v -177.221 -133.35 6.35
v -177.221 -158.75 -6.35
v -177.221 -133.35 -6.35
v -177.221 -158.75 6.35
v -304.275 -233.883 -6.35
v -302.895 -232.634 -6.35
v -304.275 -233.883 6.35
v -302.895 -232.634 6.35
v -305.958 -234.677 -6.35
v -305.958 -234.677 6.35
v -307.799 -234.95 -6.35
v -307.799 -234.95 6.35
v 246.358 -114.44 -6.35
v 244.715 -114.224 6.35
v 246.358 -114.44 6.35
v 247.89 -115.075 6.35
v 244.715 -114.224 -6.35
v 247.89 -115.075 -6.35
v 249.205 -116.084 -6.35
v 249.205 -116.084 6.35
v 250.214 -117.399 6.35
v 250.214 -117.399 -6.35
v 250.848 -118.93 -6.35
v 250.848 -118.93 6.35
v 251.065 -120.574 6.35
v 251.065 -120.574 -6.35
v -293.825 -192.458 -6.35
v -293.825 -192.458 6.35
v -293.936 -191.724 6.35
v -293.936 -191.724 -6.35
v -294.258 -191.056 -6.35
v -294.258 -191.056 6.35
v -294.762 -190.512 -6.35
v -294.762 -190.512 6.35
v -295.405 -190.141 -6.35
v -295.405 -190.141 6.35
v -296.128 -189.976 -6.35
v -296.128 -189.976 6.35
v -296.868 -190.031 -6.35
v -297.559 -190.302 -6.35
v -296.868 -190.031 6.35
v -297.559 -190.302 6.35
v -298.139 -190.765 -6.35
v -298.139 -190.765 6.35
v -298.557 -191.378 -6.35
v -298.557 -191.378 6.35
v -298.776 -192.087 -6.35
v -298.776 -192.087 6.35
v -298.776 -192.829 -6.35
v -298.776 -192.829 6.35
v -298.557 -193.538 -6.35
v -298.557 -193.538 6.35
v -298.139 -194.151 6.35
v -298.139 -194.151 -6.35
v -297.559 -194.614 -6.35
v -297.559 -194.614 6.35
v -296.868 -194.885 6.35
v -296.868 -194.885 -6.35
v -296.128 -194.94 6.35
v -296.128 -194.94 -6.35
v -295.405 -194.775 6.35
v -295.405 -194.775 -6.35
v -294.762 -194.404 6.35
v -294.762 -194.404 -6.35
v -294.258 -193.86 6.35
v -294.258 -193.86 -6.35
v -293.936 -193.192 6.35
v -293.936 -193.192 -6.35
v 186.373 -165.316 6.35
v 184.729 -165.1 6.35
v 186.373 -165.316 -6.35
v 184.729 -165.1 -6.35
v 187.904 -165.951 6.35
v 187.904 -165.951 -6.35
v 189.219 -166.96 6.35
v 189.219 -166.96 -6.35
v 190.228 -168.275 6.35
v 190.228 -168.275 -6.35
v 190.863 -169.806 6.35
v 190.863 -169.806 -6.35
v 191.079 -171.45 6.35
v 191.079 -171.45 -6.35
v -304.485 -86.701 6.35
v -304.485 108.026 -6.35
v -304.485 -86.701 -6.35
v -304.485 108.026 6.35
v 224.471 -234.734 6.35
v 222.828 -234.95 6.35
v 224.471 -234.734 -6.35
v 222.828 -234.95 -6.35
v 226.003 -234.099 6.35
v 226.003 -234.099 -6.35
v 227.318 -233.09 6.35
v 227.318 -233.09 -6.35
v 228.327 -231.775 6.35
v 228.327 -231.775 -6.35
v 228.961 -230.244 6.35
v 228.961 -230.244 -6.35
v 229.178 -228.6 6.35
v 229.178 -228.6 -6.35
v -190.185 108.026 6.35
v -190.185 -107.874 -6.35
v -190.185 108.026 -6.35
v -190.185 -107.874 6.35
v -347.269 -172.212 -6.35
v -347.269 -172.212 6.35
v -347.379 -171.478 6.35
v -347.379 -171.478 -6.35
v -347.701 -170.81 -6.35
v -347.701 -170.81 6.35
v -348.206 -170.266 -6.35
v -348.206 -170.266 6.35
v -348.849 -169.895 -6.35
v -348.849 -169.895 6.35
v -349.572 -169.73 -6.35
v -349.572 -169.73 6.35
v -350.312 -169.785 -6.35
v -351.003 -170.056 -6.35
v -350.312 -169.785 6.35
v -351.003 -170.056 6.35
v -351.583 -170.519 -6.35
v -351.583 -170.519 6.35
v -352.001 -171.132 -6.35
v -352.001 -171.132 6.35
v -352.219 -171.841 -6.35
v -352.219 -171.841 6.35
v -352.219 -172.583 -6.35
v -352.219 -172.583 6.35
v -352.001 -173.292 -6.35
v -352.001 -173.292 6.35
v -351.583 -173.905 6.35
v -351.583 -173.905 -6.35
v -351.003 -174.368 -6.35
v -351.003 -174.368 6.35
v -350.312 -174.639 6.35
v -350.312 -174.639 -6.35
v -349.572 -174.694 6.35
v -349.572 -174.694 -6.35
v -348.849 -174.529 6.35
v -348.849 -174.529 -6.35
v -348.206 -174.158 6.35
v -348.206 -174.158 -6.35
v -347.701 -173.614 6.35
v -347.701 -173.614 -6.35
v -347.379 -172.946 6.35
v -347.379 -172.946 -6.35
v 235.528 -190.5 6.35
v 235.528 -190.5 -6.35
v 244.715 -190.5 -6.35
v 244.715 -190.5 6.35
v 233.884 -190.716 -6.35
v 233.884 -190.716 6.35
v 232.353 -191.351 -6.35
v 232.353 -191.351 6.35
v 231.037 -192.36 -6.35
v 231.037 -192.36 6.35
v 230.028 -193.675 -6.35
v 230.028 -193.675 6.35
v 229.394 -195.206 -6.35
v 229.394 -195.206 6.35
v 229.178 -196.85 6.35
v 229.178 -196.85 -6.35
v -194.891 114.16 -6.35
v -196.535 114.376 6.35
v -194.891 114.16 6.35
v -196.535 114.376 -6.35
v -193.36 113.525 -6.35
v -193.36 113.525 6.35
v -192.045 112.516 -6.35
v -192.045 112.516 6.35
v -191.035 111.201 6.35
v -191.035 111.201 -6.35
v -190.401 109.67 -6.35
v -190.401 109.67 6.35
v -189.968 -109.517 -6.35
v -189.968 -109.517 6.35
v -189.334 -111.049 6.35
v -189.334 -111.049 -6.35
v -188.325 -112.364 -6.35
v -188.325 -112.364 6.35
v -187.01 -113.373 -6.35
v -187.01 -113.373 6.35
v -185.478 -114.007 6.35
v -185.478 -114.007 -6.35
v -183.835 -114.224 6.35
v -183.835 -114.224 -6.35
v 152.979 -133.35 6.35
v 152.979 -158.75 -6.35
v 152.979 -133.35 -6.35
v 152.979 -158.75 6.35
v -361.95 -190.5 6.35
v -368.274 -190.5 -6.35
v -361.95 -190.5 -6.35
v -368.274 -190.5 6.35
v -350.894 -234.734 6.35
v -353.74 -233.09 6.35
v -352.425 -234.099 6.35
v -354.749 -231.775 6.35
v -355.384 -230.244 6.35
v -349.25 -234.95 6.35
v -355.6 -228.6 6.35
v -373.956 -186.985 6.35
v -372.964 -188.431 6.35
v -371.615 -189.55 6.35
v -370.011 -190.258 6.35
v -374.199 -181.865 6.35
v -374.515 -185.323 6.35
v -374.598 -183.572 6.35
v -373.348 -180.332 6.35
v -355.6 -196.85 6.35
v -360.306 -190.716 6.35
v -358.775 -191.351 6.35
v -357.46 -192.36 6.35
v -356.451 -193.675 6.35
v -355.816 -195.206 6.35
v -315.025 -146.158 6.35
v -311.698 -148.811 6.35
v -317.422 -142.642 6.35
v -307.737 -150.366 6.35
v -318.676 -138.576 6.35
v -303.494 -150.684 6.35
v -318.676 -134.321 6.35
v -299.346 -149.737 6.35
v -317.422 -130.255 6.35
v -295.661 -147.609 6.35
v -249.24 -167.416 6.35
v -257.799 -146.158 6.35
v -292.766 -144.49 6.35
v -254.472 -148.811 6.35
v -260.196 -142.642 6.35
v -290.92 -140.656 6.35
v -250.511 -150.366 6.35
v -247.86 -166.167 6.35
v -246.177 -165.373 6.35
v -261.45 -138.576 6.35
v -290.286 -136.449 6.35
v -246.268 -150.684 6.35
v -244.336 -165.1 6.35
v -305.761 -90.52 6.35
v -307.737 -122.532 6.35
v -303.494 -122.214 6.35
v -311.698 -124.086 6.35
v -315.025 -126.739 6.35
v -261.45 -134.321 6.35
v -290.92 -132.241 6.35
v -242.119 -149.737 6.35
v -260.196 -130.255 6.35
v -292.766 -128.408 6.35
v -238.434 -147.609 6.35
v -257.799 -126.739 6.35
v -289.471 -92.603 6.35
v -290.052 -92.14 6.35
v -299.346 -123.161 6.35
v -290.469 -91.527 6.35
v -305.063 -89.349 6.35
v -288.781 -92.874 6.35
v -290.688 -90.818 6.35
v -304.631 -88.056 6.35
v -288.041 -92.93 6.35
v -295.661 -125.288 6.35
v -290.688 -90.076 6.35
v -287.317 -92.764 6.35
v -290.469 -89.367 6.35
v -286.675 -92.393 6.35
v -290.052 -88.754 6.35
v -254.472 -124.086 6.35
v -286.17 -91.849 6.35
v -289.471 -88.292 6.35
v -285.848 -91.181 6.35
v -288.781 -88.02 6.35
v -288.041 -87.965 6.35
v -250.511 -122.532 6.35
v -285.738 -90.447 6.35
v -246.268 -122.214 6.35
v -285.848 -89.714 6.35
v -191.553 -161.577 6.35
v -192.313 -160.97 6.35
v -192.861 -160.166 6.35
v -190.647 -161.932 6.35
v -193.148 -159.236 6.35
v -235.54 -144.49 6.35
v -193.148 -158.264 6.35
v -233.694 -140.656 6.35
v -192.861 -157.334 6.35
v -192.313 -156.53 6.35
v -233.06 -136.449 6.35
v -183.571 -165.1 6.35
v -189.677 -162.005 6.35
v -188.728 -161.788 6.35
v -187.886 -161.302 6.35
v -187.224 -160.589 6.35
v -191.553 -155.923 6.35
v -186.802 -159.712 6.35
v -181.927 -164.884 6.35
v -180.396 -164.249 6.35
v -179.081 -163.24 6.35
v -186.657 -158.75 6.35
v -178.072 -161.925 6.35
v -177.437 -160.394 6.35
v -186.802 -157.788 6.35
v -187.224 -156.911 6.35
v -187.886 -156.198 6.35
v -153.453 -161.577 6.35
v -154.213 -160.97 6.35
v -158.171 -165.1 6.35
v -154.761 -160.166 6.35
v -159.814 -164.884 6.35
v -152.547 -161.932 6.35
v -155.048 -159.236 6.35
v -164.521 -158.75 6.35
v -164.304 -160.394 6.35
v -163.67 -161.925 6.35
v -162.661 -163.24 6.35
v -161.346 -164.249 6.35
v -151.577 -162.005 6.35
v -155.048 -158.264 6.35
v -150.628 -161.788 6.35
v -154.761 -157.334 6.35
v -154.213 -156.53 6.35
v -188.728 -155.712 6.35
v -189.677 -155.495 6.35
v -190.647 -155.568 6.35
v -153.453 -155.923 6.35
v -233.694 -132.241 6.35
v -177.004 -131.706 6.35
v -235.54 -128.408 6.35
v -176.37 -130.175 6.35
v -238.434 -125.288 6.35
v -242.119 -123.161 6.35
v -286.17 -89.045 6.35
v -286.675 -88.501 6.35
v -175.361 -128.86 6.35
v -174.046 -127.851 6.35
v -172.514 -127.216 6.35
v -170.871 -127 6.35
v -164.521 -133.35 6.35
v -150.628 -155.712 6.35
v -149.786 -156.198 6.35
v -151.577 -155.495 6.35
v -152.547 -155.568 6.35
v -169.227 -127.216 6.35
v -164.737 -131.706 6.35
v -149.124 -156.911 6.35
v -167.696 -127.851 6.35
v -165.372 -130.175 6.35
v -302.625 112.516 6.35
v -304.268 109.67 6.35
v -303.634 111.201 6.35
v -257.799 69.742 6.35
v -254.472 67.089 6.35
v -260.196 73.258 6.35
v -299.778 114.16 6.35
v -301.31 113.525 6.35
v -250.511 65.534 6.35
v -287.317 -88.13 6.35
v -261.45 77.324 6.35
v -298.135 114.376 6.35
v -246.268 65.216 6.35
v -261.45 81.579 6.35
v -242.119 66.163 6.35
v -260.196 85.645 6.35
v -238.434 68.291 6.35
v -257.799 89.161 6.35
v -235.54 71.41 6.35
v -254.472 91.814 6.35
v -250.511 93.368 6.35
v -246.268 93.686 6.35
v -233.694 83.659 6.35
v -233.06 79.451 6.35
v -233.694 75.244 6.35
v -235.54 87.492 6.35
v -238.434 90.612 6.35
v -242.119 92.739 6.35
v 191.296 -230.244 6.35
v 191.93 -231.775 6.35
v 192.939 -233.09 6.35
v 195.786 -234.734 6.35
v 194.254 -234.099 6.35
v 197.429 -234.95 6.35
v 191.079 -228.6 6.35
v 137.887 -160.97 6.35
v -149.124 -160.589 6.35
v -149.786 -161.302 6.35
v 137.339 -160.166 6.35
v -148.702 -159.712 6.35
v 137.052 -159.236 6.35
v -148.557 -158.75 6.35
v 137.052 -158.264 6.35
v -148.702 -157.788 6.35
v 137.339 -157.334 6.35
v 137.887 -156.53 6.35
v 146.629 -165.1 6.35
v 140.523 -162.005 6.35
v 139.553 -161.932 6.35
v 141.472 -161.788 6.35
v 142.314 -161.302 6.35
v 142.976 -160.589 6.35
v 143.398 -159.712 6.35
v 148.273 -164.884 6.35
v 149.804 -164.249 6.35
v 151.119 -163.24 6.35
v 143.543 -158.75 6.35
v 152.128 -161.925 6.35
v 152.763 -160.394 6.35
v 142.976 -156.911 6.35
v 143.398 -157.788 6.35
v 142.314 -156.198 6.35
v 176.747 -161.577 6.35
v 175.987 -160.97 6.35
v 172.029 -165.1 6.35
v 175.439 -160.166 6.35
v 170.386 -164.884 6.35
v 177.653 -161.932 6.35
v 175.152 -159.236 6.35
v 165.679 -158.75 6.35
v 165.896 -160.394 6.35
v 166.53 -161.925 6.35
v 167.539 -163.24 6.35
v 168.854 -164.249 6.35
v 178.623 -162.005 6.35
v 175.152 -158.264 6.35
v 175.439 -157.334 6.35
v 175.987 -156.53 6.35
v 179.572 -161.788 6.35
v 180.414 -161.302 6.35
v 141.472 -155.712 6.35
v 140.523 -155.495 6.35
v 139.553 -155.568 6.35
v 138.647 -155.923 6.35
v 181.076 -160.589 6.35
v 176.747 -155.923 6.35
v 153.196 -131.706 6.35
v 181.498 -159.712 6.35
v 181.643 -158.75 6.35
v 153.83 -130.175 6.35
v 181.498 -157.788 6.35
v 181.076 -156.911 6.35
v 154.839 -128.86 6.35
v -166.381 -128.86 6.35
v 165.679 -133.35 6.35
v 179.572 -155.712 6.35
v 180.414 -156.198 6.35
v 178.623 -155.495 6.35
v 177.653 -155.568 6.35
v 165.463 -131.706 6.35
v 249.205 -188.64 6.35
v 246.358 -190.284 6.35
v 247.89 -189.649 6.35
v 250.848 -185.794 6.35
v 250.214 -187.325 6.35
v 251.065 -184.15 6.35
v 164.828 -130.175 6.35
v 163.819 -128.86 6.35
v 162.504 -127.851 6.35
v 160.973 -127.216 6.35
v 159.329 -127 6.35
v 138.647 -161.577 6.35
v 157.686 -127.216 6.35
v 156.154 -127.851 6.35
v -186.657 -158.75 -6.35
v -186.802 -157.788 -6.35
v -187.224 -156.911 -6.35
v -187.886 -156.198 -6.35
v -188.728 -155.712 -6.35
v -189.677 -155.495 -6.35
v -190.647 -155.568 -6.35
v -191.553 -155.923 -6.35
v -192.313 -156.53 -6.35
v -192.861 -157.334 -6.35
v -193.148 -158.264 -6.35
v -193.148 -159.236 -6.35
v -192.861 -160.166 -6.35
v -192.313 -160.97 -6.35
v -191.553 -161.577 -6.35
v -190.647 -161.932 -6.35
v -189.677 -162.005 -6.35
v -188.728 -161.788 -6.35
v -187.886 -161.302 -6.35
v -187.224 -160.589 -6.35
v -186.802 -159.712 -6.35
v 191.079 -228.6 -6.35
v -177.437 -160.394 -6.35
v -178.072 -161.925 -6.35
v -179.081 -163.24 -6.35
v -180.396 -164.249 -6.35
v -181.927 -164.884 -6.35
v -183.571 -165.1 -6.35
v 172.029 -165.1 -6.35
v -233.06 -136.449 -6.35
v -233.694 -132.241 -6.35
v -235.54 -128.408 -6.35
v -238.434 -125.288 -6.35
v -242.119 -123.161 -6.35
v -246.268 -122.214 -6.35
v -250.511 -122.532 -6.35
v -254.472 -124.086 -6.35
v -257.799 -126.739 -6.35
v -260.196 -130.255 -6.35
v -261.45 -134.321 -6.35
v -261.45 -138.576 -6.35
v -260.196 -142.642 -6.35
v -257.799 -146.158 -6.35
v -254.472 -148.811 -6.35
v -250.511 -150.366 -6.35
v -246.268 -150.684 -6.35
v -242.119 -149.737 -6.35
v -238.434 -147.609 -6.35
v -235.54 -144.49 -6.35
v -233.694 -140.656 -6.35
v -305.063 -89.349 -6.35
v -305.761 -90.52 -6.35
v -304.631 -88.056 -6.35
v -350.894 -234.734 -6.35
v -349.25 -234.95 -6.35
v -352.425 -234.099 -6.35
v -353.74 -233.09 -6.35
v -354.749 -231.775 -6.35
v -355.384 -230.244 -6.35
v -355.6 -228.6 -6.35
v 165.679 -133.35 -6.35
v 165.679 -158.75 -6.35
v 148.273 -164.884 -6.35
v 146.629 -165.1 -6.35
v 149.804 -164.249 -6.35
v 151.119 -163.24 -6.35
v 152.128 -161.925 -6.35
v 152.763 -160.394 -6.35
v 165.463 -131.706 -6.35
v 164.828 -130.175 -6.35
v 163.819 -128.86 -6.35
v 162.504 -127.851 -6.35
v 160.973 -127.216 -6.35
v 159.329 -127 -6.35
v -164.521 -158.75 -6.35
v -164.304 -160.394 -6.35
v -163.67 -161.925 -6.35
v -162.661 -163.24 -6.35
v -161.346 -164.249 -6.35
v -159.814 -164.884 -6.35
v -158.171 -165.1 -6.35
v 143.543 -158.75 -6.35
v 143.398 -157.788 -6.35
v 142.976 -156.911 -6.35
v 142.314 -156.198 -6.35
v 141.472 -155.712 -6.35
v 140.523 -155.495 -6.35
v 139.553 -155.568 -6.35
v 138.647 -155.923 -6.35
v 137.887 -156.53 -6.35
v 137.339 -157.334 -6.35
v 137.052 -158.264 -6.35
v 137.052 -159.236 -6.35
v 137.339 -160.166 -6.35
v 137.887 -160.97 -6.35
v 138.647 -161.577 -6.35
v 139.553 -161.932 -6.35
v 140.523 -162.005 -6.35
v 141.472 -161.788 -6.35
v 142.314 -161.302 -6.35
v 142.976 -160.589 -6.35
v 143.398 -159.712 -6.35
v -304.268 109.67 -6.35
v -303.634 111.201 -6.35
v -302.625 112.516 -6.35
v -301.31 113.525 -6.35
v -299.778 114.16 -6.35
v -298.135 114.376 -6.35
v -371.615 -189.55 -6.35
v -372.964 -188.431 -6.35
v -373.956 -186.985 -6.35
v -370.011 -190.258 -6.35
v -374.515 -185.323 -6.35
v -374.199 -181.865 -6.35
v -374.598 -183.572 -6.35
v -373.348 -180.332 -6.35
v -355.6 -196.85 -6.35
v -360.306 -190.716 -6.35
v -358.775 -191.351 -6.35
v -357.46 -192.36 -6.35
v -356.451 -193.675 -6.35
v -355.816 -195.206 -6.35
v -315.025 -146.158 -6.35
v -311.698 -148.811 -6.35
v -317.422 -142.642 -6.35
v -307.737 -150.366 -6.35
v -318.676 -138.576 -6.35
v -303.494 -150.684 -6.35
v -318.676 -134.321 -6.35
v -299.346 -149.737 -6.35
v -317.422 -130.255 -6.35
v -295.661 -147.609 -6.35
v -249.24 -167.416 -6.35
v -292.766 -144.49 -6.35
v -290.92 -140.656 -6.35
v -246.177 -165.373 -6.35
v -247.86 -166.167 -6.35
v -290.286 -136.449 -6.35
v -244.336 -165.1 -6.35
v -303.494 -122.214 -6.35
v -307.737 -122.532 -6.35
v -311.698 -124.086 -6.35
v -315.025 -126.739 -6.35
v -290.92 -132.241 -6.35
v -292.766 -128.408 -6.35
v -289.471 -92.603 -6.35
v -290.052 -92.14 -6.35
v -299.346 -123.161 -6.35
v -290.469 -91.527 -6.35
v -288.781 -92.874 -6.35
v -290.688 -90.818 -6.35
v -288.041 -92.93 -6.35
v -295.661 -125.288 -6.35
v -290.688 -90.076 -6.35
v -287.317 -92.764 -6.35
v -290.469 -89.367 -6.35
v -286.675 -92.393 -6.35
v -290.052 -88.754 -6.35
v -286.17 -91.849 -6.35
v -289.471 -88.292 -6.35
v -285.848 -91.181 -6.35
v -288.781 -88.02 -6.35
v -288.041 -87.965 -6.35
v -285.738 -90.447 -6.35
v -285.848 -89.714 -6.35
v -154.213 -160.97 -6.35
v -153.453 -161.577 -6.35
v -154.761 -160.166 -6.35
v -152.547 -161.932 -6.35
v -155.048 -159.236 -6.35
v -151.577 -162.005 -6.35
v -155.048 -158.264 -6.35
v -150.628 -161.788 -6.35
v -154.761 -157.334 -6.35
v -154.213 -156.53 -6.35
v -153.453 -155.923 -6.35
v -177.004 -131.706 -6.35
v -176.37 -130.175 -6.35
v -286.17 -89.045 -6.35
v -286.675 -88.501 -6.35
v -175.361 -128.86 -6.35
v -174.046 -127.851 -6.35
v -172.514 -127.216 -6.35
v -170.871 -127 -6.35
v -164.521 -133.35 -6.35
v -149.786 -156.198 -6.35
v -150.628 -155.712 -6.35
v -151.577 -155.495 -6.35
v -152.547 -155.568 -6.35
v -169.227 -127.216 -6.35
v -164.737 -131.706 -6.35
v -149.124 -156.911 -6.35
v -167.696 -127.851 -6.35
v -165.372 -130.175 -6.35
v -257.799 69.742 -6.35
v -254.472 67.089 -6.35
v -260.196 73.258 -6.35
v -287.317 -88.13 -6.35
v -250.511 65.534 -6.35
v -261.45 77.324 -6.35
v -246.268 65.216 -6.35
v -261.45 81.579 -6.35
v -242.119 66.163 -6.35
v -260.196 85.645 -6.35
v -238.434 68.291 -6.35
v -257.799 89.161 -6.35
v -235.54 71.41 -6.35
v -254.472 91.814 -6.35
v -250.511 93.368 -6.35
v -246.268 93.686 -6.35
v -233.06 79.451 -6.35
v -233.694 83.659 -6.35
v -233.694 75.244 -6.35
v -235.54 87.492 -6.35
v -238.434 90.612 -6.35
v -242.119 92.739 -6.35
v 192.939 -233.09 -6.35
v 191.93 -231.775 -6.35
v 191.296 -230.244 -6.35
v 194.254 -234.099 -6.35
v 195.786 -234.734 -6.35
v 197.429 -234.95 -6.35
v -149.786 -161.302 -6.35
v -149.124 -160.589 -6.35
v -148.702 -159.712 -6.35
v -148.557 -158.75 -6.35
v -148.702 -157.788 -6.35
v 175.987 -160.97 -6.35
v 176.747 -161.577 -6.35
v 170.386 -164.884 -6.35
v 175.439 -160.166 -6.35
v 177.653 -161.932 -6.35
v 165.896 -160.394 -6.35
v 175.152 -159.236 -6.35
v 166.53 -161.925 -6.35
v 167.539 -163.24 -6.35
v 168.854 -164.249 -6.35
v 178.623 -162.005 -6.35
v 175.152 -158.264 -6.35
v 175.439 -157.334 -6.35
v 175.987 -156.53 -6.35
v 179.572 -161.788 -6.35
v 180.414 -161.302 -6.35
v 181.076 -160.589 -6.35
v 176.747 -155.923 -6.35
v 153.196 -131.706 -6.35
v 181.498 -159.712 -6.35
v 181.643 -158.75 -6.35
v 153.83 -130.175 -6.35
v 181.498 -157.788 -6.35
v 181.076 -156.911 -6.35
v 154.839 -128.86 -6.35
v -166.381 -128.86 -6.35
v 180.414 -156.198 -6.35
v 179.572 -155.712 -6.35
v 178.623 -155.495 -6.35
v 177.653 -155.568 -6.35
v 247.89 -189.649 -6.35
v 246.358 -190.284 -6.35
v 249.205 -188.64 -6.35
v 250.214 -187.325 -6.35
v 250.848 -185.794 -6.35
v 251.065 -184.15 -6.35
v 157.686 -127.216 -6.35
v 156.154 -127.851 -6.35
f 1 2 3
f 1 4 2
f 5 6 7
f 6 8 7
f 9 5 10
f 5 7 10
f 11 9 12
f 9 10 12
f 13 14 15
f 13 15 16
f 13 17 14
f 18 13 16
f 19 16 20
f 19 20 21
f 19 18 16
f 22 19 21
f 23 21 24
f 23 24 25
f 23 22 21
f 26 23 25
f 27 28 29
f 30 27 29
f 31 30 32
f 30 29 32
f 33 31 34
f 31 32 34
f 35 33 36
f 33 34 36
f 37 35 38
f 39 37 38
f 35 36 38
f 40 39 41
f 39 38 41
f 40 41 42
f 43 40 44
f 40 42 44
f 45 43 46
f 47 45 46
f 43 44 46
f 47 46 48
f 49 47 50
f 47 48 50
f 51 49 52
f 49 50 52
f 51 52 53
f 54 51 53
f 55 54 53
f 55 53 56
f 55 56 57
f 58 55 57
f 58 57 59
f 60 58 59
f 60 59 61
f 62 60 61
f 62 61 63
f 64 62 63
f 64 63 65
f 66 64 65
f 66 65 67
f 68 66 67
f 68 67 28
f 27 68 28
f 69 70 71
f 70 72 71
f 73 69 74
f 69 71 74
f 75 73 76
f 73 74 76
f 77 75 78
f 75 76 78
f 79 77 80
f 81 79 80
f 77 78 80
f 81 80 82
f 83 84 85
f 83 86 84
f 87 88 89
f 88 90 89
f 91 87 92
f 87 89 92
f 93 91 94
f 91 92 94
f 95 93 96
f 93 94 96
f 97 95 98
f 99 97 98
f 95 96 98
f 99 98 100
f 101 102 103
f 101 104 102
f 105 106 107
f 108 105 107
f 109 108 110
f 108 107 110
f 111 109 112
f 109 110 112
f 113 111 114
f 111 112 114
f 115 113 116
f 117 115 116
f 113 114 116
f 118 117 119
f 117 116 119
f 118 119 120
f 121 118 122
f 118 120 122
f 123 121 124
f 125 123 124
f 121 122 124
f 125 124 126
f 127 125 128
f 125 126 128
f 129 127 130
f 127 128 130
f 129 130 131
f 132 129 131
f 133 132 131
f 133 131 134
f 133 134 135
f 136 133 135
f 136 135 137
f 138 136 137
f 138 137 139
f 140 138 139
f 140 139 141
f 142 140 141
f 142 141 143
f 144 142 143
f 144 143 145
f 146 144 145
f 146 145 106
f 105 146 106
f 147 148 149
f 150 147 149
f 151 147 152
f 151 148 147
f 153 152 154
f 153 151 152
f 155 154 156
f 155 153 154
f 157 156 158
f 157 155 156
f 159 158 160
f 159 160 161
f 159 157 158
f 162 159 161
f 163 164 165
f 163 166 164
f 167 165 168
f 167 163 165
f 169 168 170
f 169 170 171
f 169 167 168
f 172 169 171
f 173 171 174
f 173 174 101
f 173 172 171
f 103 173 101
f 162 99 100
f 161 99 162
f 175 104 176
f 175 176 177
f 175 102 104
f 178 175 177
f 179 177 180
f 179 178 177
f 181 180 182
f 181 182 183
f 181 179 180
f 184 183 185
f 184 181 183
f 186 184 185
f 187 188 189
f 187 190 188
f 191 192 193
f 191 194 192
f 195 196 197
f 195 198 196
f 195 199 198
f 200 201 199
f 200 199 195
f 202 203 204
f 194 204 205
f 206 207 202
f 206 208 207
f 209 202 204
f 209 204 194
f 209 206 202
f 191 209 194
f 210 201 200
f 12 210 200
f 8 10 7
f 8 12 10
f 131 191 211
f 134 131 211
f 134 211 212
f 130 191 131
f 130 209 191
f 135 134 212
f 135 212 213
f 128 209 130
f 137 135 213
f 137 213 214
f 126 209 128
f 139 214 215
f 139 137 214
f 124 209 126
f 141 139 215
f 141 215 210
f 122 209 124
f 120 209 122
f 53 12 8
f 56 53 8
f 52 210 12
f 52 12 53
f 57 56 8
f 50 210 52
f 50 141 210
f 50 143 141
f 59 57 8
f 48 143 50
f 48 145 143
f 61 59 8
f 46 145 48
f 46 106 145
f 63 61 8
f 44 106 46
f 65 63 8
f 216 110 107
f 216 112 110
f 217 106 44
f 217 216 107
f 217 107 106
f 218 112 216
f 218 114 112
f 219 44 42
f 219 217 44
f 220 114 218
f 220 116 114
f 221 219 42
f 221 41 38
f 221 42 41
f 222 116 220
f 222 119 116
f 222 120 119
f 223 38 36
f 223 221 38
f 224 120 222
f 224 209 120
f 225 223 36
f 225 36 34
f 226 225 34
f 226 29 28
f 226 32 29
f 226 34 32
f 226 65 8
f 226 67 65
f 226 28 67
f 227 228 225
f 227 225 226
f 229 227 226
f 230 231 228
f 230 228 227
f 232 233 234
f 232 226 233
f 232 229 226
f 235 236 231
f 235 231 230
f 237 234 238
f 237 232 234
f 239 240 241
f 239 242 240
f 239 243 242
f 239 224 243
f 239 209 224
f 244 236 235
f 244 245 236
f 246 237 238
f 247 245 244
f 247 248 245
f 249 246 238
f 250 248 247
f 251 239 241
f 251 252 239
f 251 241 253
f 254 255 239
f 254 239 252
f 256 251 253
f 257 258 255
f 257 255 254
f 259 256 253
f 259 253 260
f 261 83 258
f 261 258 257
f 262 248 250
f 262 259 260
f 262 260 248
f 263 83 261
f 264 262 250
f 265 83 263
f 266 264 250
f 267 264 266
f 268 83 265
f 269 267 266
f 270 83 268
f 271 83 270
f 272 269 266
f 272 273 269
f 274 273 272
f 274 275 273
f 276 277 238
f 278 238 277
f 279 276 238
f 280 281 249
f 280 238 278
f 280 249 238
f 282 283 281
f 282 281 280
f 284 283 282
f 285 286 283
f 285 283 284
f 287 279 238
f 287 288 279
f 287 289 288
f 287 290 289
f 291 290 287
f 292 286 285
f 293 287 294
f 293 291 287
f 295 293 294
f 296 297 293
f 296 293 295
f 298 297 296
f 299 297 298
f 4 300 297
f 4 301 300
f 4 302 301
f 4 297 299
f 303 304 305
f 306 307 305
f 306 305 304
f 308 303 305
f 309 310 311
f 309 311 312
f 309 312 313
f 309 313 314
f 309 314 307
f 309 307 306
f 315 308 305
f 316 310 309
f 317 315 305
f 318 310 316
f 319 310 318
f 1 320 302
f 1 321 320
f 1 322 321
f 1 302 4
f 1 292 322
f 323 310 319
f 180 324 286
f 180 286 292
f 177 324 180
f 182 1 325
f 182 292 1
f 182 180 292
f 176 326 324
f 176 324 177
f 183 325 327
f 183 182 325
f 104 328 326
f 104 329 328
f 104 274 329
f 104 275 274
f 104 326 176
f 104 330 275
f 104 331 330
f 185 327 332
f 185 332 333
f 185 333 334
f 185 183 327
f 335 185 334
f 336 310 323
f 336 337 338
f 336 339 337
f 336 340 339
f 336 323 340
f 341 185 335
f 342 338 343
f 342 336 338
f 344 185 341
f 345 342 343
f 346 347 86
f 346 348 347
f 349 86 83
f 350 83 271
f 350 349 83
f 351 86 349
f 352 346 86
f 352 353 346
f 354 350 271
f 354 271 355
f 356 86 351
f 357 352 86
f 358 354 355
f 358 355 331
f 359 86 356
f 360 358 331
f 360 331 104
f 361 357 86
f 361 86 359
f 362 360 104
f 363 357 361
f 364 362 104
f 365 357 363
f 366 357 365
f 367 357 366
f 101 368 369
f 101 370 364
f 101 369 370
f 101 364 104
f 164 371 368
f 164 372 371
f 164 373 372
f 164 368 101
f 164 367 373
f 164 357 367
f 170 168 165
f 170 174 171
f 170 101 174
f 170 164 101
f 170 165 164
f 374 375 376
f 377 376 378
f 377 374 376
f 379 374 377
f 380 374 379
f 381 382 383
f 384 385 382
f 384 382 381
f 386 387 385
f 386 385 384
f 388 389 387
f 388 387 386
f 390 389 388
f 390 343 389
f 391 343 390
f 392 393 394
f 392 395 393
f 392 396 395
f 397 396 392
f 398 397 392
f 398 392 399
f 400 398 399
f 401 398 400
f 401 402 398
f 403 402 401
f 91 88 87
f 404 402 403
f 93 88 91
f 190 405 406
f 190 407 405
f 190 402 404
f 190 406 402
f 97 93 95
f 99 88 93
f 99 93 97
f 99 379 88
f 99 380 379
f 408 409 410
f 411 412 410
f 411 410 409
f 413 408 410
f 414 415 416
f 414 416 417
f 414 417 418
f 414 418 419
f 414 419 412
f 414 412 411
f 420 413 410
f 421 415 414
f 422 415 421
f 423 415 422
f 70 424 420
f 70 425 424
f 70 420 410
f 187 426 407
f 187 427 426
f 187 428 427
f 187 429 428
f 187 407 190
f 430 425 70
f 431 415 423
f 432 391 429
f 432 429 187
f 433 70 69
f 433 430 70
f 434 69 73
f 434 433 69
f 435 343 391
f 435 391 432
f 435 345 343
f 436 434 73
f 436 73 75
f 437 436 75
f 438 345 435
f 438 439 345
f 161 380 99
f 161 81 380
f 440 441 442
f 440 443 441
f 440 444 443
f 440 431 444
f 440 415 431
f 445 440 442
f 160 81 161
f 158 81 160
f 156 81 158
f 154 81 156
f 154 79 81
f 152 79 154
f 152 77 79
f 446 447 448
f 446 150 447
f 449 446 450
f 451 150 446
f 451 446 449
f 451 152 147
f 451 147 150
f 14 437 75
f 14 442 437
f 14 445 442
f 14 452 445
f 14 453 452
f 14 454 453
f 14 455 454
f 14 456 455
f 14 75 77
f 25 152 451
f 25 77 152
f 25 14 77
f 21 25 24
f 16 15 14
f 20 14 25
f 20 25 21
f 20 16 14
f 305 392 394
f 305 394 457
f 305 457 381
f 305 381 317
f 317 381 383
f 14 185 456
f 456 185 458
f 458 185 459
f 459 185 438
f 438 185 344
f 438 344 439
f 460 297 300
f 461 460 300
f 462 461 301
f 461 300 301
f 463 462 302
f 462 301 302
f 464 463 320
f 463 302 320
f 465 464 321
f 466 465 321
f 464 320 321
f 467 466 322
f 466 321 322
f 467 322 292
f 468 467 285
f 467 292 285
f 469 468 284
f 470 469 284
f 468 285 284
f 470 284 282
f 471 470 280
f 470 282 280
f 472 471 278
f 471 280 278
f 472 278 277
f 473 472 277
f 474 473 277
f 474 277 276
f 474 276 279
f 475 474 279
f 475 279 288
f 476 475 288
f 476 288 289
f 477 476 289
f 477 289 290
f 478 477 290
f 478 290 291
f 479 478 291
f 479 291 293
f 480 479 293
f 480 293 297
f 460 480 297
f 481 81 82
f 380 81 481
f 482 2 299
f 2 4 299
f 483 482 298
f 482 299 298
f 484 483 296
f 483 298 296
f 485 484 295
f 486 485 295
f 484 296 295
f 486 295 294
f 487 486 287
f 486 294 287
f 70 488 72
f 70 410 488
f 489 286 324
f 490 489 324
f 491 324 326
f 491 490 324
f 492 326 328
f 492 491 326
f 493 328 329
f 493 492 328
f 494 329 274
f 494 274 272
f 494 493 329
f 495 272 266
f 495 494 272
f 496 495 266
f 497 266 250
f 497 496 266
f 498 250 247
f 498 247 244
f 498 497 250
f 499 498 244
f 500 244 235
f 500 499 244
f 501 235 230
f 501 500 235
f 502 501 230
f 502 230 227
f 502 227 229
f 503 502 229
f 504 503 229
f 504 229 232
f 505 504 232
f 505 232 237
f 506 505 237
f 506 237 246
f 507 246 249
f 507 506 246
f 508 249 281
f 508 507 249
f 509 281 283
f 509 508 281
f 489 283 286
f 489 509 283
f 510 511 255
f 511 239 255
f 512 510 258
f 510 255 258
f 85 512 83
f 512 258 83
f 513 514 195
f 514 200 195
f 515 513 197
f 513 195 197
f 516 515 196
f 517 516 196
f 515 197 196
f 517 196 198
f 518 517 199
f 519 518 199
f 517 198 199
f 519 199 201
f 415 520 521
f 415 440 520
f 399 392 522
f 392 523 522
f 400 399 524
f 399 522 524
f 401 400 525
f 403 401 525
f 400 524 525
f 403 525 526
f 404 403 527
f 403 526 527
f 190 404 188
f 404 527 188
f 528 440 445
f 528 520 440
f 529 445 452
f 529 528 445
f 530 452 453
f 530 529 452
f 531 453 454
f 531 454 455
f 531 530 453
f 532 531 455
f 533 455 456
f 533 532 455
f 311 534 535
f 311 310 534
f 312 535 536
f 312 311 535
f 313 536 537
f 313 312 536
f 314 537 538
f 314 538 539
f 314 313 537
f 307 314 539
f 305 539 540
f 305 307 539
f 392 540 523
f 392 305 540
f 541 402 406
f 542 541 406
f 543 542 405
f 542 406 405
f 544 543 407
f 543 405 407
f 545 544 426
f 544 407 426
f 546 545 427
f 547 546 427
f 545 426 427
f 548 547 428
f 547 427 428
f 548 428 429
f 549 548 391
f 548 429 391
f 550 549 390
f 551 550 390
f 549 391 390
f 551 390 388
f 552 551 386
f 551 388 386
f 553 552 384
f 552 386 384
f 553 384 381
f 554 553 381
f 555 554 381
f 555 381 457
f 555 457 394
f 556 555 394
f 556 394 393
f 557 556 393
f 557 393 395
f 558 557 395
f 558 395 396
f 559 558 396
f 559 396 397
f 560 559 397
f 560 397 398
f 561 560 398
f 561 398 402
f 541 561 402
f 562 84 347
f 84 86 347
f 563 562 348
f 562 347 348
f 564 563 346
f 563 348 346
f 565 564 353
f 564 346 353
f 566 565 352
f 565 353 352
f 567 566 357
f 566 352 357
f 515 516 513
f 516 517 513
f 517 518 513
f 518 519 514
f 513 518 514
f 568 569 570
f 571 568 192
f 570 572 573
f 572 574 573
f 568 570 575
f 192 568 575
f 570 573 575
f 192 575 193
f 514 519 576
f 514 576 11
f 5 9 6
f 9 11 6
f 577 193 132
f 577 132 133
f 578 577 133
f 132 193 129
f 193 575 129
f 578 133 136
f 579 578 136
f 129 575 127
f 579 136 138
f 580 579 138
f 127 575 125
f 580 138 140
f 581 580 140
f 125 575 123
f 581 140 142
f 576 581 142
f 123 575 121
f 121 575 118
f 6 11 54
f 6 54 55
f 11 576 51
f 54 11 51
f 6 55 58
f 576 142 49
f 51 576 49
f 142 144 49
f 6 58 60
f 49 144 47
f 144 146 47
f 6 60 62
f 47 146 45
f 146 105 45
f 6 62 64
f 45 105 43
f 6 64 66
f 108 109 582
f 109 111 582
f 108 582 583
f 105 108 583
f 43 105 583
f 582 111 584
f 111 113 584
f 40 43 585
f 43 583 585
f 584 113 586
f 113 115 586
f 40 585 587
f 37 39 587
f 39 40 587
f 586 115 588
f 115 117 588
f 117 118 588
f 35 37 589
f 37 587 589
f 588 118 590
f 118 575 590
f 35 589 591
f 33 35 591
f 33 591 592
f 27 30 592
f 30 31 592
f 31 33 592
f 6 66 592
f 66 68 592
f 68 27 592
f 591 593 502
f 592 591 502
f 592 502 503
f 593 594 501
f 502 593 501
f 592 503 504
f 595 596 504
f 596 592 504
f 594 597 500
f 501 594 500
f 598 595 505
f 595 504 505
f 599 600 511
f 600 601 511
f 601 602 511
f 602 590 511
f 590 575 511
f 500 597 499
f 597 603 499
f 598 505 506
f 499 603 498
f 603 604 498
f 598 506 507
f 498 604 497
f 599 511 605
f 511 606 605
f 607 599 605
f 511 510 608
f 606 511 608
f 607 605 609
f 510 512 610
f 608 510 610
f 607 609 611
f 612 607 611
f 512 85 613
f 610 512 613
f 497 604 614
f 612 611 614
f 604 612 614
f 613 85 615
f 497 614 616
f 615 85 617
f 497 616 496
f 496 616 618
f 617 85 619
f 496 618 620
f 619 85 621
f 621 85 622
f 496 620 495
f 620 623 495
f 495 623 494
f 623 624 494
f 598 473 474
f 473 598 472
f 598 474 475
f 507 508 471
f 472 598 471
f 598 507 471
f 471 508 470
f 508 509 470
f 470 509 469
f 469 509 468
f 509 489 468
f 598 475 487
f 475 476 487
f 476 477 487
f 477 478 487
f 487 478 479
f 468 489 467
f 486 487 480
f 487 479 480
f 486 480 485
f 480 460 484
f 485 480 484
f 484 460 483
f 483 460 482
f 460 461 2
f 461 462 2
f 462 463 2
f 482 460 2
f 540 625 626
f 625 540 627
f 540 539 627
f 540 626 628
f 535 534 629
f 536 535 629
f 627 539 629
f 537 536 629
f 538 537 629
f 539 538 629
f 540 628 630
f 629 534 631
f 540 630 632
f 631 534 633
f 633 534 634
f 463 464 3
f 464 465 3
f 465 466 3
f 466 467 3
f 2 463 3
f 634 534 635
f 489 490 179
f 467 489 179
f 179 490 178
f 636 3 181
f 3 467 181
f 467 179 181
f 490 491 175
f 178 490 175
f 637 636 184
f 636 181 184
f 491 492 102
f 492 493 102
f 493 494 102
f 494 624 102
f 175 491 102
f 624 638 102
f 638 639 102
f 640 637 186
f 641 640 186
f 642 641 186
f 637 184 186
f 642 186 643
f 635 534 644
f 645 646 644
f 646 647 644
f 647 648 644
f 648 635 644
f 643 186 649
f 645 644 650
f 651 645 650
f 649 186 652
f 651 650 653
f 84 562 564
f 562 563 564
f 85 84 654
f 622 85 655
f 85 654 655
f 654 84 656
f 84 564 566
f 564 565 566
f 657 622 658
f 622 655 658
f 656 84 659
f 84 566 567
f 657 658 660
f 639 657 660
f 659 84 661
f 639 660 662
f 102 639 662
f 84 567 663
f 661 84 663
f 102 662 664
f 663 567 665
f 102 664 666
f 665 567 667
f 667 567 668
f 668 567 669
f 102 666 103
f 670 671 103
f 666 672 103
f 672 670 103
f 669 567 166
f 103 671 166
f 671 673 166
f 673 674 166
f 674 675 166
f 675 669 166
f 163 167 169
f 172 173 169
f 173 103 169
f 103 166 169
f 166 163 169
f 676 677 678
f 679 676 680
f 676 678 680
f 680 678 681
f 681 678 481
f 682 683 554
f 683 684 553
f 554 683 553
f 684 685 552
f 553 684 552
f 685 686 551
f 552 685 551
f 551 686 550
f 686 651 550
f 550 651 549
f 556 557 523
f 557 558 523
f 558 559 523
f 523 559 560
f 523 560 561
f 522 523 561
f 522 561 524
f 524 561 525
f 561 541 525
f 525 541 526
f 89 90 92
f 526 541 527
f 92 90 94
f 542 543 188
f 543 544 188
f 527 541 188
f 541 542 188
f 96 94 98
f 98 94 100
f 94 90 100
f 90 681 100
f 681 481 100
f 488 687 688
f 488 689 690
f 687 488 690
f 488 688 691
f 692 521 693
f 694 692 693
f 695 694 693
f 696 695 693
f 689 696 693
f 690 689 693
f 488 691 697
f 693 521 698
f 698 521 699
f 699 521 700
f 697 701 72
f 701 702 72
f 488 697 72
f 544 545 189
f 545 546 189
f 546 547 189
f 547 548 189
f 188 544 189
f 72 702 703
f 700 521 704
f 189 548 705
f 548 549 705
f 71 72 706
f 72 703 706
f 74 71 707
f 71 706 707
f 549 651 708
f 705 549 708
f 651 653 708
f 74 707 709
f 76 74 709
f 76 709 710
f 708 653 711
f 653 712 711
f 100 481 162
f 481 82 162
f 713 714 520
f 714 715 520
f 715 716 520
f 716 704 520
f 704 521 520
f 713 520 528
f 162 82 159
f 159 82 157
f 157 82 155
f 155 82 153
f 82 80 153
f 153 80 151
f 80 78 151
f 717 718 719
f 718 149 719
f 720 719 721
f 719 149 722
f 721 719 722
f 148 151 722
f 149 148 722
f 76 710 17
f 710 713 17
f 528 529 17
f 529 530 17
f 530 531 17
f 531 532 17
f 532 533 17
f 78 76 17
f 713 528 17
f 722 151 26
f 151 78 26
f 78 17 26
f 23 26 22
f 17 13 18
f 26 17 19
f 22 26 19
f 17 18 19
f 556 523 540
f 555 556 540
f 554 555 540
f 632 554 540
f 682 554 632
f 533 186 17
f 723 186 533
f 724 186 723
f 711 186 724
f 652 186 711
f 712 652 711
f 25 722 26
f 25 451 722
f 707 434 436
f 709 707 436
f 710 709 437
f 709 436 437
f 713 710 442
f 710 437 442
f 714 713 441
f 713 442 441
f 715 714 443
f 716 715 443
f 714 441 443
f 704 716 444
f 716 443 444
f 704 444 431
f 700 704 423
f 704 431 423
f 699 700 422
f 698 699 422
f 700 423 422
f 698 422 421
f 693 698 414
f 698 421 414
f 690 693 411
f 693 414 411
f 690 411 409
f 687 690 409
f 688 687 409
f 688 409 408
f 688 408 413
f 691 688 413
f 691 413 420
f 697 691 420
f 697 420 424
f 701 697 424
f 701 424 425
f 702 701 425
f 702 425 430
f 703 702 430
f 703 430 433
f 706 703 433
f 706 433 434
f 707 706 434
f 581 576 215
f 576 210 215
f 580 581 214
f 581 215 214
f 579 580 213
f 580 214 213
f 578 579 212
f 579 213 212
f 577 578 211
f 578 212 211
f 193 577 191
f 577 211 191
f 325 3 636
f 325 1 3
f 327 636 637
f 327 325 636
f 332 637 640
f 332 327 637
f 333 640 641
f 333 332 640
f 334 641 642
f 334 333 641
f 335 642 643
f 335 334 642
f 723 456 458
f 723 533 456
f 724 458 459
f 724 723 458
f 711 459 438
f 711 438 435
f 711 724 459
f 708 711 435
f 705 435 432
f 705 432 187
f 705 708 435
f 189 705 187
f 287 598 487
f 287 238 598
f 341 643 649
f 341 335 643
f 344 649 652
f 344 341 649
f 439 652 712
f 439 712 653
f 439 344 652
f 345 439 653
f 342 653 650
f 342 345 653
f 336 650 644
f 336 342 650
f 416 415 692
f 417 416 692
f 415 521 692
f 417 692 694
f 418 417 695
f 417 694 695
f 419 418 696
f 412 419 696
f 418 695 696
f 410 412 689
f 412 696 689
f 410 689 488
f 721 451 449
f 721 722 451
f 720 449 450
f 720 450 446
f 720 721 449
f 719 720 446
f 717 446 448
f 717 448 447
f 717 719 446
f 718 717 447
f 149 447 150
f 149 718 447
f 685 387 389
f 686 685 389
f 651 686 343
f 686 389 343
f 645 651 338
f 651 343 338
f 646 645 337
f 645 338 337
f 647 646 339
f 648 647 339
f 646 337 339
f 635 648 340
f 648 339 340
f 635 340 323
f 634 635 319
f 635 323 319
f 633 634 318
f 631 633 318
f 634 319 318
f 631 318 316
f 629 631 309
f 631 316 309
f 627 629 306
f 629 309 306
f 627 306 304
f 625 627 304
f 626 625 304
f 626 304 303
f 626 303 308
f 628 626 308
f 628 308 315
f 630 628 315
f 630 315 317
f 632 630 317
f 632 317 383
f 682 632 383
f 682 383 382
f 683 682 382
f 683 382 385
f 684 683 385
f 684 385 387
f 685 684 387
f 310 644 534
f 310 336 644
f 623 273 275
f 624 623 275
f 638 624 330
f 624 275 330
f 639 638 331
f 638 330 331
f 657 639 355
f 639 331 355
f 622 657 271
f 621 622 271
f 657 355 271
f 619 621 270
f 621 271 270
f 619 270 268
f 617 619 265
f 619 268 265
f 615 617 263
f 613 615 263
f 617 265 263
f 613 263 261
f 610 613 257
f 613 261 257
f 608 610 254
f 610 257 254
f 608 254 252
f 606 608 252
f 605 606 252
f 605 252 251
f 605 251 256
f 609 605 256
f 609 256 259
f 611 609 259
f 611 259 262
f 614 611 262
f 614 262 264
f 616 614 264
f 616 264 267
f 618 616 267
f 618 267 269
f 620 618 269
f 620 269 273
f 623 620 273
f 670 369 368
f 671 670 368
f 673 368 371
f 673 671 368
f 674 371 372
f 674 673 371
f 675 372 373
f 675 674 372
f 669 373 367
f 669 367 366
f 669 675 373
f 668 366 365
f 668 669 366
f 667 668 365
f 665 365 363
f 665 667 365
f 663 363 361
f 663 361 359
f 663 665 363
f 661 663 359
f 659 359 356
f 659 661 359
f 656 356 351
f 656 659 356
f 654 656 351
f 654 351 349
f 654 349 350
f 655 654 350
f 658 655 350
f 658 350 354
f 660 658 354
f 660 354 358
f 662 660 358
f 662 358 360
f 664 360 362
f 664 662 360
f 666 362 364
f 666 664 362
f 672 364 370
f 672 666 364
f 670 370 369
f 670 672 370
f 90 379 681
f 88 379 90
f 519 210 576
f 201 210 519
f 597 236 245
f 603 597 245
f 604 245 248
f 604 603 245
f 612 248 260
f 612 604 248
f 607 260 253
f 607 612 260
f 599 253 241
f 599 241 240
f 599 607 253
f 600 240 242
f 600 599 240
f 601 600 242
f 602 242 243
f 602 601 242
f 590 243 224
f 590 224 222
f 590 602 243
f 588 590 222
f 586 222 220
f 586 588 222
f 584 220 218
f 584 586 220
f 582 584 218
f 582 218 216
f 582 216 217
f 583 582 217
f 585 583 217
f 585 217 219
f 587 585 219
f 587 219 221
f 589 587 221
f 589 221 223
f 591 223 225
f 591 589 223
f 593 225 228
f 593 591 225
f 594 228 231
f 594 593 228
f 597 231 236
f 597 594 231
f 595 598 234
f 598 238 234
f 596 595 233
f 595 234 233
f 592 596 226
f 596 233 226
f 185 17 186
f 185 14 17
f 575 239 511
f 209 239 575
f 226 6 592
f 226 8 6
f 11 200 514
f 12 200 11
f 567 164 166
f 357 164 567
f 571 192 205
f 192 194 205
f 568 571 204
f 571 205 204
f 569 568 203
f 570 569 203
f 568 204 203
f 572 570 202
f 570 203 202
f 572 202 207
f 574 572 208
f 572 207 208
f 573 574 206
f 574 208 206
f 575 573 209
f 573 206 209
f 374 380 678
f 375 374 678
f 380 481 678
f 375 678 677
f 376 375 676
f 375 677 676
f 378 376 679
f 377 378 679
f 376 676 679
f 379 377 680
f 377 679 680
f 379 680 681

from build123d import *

# Parameters (mm, degrees)
SKETCH1_R           = 14.2748
BOSS_EXTRUDE1_DEPTH = 6.35
SKETCH2_R           = 2.4892
CUT_EXTRUDE1_DEPTH  = 448.798830392
FILLET1_R           = 6.35
SKETCH3_R           = 3.2639
CUT_EXTRUDE2_DEPTH  = 448.798830392
FILLET2_R           = 6.35


with BuildPart() as part:
    # Sketch1 → Boss-Extrude1 (new, symmetric)
    # profile 1 of 2: a face of its own
    with BuildSketch(Plane.XY):
        Polygon((-190.184633538, -88.8238), (-190.184633538, 114.3762), (-304.484633538, 114.3762), (-304.484633538, -88.8238), (-381, -190.5), (-355.6, -190.5), (-355.6, -234.95), (-304.8, -234.95), (-247.334633538, -165.1), (-177.220797536, -165.1), (-177.220797536, -127), (-164.520797536, -127), (-164.520797536, -165.1), (152.979202464, -165.1), (152.979202464, -127), (165.679202464, -127), (165.679202464, -165.1), (191.079202464, -165.1), (191.079202464, -234.95), (229.17754613, -234.95), (229.17754613, -190.5), (251.064839113, -190.5), (251.064839113, -114.2238), (-190.184633538, -114.2238), align=None)
        with Locations((-304.560833538, -136.4488)):
            Circle(SKETCH1_R, mode=Mode.SUBTRACT)
        with Locations((-247.334633538, -136.4488)):
            Circle(SKETCH1_R, mode=Mode.SUBTRACT)
        with Locations((-247.334633538, 79.4512)):
            Circle(SKETCH1_R, mode=Mode.SUBTRACT)
    # profile 2 of 2: a face of its own
    with BuildSketch(Plane.XY):
        Polygon((-190.184633538, -88.8238), (-190.184633538, 114.3762), (-304.484633538, 114.3762), (-304.484633538, -88.8238), (-381, -190.5), (-355.6, -190.5), (-355.6, -234.95), (-304.8, -234.95), (-247.334633538, -165.1), (-177.220797536, -165.1), (-177.220797536, -127), (-164.520797536, -127), (-164.520797536, -165.1), (152.979202464, -165.1), (152.979202464, -127), (165.679202464, -127), (165.679202464, -165.1), (191.079202464, -165.1), (191.079202464, -234.95), (229.17754613, -234.95), (229.17754613, -190.5), (251.064839113, -190.5), (251.064839113, -114.2238), (-190.184633538, -114.2238), align=None)
        with Locations((-304.560833538, -136.4488)):
            Circle(SKETCH1_R, mode=Mode.SUBTRACT)
        with Locations((-247.334633538, -136.4488)):
            Circle(SKETCH1_R, mode=Mode.SUBTRACT)
        with Locations((-247.334633538, 79.4512)):
            Circle(SKETCH1_R, mode=Mode.SUBTRACT)
    extrude(amount=BOSS_EXTRUDE1_DEPTH, both=True)

    # Sketch2 → Cut-Extrude1 (cut, through all)
    with BuildSketch(Plane.XY.offset(6.35)):
        with Locations((-288.22680671, -90.447274763)):
            Circle(SKETCH2_R)
        with Locations((-349.758, -172.212)):
            Circle(SKETCH2_R)
        with Locations((-296.314296632, -192.457816118)):
            Circle(SKETCH2_R)
    extrude(amount=-CUT_EXTRUDE1_DEPTH, mode=Mode.SUBTRACT)

    # Fillet1
    fillet1_edges = [part.edges().sort_by_distance(p)[0] for p in [
        (152.979202464, -127, 0),
        (165.679202464, -127, 0),
        (-164.520797536, -127, 0),
        (-177.220797536, -127, 0),
    ]]
    fillet(fillet1_edges, radius=FILLET1_R - 0.0001)  # a hair under: the kernel refuses the full size

    # Sketch3 → Cut-Extrude2 (cut, through all)
    with BuildSketch(Plane.XY.offset(6.35)):
        with Locations((-189.920797536, -158.75)):
            Circle(SKETCH3_R)
        with Locations((178.379202464, -158.75)):
            Circle(SKETCH3_R)
        with Locations((-151.820797536, -158.75)):
            Circle(SKETCH3_R)
        with Locations((140.279202464, -158.75)):
            Circle(SKETCH3_R)
    extrude(amount=-CUT_EXTRUDE2_DEPTH, mode=Mode.SUBTRACT)

    # Fillet2
    fillet2_edges = [part.edges().sort_by_distance(p)[0] for p in [
        (251.064839113, -190.5, 0),
        (229.17754613, -190.5, 0),
        (229.17754613, -234.95, 0),
        (191.079202464, -234.95, 0),
        (191.079202464, -165.1, 0),
        (165.679202464, -165.1, 0),
        (152.979202464, -165.1, 0),
        (-164.520797536, -165.1, 0),
        (-177.220797536, -165.1, 0),
        (-247.334633538, -165.1, 0),
        (-304.8, -234.95, 0),
        (-355.6, -234.95, 0),
        (-355.6, -190.5, 0),
        (-381, -190.5, 0),
        (-304.484633538, -88.8238, 0),
        (-304.484633538, 114.3762, 0),
        (-190.184633538, 114.3762, 0),
        (-190.184633538, -114.2238, 0),
        (251.064839113, -114.2238, 0),
    ]]
    fillet(fillet2_edges, radius=FILLET2_R)


solid = part.part
